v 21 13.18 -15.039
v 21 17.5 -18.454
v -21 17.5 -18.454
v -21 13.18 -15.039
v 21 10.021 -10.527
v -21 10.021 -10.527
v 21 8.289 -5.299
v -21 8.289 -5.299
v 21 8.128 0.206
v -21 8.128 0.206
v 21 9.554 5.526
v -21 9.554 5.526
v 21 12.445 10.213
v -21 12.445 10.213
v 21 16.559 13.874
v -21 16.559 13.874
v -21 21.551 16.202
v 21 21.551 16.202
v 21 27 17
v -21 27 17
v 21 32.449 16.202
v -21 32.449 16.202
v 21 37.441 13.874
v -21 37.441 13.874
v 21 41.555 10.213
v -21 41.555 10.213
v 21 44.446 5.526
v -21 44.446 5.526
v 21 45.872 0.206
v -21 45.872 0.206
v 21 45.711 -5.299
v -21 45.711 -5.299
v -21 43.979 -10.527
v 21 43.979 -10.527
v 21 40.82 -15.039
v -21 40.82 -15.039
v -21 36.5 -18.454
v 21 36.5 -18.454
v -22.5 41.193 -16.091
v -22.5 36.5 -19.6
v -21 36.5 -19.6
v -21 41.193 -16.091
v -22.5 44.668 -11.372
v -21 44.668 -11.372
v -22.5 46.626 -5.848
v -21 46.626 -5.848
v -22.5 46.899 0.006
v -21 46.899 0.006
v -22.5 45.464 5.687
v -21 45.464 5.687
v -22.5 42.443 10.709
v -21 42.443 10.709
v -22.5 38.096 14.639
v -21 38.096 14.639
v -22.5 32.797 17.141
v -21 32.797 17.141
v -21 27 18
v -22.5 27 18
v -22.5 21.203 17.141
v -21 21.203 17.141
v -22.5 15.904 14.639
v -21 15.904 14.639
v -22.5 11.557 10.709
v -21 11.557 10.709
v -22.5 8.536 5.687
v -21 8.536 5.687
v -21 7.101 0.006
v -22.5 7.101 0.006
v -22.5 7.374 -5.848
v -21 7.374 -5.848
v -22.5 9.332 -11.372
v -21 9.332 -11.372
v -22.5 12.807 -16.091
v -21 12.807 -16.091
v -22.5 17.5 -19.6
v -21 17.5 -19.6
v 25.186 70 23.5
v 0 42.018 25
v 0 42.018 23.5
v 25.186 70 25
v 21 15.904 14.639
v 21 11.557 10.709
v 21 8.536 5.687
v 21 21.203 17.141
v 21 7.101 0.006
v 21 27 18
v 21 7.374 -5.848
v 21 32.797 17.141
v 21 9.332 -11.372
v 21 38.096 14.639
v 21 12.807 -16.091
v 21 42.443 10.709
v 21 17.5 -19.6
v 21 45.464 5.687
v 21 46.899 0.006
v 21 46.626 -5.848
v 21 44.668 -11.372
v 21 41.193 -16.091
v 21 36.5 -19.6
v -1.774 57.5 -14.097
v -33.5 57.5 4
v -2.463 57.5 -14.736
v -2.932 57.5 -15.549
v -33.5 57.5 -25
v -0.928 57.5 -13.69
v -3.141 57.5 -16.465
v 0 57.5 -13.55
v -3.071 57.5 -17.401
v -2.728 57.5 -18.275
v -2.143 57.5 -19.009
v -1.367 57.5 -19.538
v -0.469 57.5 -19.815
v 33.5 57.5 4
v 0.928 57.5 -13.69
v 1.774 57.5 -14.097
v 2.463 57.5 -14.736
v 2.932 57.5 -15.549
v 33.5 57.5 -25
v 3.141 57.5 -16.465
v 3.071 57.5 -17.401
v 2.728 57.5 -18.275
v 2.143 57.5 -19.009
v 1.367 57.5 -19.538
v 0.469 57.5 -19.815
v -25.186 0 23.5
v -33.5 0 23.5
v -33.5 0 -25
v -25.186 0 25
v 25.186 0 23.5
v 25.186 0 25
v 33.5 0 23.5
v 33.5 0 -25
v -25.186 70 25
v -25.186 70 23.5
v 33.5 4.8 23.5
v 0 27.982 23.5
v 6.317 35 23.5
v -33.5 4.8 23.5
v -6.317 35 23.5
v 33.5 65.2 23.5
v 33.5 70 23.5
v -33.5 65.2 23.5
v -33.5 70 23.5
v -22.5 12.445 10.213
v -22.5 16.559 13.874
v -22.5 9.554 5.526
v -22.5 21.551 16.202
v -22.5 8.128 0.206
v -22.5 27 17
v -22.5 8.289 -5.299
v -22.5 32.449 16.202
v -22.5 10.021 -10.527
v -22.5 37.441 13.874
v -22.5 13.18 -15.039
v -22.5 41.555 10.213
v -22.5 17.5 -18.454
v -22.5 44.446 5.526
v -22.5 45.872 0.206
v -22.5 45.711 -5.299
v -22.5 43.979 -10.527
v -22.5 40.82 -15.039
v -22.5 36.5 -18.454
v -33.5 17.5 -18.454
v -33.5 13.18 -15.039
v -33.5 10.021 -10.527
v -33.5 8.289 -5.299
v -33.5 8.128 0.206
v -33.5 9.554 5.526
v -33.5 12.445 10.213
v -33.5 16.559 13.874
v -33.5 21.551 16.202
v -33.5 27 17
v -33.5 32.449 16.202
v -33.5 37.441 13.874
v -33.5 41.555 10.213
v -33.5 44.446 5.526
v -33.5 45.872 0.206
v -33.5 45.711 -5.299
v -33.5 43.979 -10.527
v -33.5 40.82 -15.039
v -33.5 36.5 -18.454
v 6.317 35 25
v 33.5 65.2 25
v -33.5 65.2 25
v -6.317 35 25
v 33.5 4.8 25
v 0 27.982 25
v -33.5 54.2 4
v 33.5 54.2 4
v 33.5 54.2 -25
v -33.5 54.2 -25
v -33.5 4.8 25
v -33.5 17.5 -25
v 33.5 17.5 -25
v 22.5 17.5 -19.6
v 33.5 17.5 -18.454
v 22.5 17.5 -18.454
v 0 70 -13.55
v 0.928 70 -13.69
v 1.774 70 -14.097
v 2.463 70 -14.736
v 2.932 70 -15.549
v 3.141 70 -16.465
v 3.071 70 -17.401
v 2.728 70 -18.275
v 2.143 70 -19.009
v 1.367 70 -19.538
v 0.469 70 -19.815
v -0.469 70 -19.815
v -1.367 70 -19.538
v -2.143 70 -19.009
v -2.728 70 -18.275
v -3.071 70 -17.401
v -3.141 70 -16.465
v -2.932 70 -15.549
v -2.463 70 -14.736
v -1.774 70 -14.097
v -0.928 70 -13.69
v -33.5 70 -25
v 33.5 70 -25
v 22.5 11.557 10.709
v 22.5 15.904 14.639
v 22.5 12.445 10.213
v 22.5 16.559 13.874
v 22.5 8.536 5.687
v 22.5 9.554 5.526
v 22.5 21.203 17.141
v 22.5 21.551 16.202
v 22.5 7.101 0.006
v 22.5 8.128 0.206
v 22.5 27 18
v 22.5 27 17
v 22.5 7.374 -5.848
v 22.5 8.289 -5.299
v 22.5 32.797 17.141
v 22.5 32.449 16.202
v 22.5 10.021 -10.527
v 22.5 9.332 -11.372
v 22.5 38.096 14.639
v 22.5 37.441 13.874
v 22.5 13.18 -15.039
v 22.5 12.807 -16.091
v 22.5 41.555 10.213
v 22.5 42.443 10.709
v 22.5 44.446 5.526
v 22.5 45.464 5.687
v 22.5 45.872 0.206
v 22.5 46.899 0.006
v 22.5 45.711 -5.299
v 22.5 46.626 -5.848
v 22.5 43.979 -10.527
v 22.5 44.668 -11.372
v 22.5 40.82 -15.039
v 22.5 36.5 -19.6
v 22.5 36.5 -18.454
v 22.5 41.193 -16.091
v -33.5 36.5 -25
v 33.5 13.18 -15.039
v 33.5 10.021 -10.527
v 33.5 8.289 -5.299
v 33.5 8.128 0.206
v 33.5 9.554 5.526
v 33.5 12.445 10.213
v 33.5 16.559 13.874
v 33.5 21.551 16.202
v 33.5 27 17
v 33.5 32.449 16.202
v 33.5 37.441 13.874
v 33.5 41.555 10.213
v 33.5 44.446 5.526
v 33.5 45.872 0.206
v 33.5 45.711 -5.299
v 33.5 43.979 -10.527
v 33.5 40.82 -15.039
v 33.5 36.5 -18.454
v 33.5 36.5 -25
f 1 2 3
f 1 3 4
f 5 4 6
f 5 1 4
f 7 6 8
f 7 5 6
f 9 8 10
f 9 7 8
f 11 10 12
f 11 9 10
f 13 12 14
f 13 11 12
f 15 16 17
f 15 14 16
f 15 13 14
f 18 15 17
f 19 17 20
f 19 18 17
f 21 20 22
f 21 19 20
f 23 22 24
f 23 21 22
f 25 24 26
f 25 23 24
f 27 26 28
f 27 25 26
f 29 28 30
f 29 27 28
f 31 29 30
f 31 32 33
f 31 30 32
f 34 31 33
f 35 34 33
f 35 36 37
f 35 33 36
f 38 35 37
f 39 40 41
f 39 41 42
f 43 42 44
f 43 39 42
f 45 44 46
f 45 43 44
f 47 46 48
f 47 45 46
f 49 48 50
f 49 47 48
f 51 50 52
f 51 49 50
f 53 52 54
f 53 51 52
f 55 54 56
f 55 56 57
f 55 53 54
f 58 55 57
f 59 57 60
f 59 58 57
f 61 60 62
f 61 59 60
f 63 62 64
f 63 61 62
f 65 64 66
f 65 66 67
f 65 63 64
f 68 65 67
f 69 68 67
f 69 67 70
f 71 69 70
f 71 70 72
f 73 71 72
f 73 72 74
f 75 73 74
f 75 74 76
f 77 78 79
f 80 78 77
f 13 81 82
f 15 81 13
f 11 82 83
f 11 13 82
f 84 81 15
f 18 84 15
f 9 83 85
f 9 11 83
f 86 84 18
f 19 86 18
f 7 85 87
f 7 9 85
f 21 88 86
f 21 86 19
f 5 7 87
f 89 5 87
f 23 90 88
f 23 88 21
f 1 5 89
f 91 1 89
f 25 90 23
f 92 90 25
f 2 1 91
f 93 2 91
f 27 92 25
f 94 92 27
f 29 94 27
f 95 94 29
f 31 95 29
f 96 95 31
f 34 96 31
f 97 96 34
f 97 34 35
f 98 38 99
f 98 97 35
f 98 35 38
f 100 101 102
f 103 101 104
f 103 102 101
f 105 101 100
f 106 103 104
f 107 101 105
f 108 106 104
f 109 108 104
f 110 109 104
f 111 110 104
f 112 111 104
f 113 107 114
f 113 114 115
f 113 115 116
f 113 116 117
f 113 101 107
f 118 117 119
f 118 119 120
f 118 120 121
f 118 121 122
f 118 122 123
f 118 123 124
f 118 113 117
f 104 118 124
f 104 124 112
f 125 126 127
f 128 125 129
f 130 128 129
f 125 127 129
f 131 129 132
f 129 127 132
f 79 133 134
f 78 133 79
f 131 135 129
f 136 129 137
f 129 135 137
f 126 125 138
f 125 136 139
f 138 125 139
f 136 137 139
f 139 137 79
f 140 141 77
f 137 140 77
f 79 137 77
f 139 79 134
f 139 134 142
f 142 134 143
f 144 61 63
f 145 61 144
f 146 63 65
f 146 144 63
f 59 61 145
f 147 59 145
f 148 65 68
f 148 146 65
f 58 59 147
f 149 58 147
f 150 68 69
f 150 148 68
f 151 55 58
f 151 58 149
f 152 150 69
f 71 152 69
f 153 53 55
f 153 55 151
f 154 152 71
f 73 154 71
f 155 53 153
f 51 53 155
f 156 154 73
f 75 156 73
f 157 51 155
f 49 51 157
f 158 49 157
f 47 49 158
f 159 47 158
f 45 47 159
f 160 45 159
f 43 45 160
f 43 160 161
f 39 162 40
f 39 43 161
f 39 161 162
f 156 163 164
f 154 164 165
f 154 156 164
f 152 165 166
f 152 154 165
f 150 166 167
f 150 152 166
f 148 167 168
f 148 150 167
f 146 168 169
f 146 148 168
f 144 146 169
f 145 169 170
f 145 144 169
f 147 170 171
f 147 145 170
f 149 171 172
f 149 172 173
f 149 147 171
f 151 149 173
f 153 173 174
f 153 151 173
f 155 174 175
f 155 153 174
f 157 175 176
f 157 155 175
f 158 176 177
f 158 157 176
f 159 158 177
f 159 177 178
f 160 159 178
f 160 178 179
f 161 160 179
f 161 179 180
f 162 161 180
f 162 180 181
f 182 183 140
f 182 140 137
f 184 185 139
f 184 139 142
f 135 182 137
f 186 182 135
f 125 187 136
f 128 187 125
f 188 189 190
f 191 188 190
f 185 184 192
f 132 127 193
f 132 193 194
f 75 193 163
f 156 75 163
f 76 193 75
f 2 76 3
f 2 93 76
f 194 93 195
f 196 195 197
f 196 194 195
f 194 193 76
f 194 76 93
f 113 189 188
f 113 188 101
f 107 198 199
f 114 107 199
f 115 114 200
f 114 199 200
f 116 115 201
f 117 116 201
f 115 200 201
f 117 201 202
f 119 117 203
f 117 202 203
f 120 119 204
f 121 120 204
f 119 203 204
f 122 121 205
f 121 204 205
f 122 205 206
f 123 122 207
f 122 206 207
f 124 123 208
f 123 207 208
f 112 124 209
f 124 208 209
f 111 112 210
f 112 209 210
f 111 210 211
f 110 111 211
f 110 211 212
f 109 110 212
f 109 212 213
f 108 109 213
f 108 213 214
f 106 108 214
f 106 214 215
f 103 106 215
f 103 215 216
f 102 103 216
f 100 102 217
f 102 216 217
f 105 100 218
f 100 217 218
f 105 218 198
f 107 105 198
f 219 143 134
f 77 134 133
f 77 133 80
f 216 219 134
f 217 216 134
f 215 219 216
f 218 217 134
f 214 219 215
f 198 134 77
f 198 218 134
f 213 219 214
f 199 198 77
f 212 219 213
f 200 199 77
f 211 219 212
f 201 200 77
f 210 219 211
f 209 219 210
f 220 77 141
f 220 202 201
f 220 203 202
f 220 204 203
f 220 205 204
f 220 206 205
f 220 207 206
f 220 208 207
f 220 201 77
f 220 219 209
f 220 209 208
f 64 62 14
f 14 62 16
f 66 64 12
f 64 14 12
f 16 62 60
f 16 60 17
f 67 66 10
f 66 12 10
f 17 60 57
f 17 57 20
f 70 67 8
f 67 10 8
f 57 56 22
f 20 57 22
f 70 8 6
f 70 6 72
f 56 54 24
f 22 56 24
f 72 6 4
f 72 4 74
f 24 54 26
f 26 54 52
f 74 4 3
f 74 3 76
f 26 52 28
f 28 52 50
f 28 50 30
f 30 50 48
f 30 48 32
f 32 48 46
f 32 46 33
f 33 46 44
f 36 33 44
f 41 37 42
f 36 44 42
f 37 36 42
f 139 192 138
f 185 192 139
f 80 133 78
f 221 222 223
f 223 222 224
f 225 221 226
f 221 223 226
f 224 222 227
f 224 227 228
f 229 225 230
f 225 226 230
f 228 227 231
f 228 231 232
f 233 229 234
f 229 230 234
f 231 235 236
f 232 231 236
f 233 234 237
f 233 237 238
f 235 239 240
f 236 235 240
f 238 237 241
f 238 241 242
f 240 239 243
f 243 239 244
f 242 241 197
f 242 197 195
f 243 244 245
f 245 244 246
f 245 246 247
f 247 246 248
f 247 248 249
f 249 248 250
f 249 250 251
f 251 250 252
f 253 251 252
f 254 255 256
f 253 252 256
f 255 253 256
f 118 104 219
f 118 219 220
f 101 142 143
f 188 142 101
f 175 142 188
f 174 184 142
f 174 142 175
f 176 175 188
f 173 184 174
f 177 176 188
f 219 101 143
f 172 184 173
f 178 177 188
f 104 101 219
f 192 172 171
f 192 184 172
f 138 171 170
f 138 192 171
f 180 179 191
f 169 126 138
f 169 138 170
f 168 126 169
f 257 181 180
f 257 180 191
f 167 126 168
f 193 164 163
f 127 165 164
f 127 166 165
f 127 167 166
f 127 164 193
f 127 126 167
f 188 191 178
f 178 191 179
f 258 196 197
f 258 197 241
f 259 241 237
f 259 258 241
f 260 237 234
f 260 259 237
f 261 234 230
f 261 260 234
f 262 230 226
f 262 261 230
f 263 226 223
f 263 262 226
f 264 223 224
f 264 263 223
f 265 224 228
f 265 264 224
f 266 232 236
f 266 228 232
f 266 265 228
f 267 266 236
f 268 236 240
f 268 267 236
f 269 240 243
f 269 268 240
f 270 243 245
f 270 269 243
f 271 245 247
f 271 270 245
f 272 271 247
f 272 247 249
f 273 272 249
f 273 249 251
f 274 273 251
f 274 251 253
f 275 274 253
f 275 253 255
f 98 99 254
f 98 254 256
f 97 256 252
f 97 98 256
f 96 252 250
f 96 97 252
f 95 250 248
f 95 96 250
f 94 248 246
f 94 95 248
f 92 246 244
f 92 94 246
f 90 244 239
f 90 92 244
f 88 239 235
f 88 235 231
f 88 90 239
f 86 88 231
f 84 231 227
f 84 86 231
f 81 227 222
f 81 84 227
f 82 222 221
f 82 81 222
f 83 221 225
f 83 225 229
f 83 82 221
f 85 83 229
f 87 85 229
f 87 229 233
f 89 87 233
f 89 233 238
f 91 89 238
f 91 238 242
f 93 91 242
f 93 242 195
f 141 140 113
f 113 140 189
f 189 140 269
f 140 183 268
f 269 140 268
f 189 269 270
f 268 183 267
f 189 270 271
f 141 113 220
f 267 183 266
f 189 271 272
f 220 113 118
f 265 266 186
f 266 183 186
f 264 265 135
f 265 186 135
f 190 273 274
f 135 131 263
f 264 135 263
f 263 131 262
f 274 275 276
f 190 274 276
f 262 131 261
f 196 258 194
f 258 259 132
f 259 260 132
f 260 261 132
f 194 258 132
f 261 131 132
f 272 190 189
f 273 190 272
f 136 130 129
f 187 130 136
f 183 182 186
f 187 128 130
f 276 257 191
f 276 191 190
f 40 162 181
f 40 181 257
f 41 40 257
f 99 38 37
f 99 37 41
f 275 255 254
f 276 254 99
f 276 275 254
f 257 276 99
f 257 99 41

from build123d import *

# Parameters (mm, degrees)
SKETCH1_W           = 67
SKETCH1_H           = 50
BOSS_EXTRUDE1_DEPTH = 70
SKETCH3_W           = 29
SKETCH3_H           = 3.3
CUT_EXTRUDE1_DEPTH  = 67
SKETCH4_R           = 20
CUT_EXTRUDE2_DEPTH  = 1.5
CUT_EXTRUDE3_START  = -1.5
SKETCH5_R           = 20
CUT_EXTRUDE3_DEPTH  = 1.5
SKETCH7_R           = 3.15
CUT_EXTRUDE4_DEPTH  = 12.5
CUT_EXTRUDE5_DEPTH  = 1.5


with BuildPart() as part:
    # Sketch1 → Boss-Extrude1 (new body)
    with BuildSketch(Plane(origin=(0, 0, 0), x_dir=(1, 0, 0), z_dir=(0, 1, 0))):
        Rectangle(SKETCH1_W, SKETCH1_H)
    extrude(amount=BOSS_EXTRUDE1_DEPTH)

    # Sketch3 → Cut-Extrude1 (cut)
    with BuildSketch(Plane(origin=(33.5, 0, 0), x_dir=(0, 0, -1), z_dir=(1, 0, 0))):
        with Locations((10.5, 55.85)):
            Rectangle(SKETCH3_W, SKETCH3_H)
        with BuildLine():
            Line((25, 36.5), (25, 17.5))
            Line((25, 17.5), (18.454482672, 17.5))
            ThreePointArc((18.454482672, 17.5), (-17, 27), (18.454482672, 36.5))
            Line((18.454482672, 36.5), (25, 36.5))
        make_face()
    extrude(amount=-CUT_EXTRUDE1_DEPTH, mode=Mode.SUBTRACT)

    # Sketch4 → Cut-Extrude2 (cut)
    with BuildSketch(Plane(origin=(21, 0, 0), x_dir=(0, 0, -1), z_dir=(1, 0, 0))):
        with Locations((2, 27)):
            Circle(SKETCH4_R)
    extrude(amount=CUT_EXTRUDE2_DEPTH, mode=Mode.SUBTRACT)

    # Sketch5 → Cut-Extrude3 (cut)
    with BuildSketch(Plane(origin=(-21, 0, 0), x_dir=(0, 0, -1), z_dir=(1, 0, 0)).offset(CUT_EXTRUDE3_START)):
        with Locations((2, 27)):
            Circle(SKETCH5_R)
    extrude(amount=CUT_EXTRUDE3_DEPTH, mode=Mode.SUBTRACT)

    # Sketch7 → Cut-Extrude4 (cut)
    with BuildSketch(Plane(origin=(0, 70, 0), x_dir=(1, 0, 0), z_dir=(0, 1, 0))):
        with Locations(Location((0, 16.7, 0), (0, 0, 270))):
            Circle(SKETCH7_R)
    extrude(amount=-CUT_EXTRUDE4_DEPTH, mode=Mode.SUBTRACT)

    # Sketch9 → Cut-Extrude5 (cut)
    with BuildSketch(Plane.XY.offset(25)):
        Polygon((-33.5, 0), (-33.5, 4.8), (-6.317148544, 35), (-33.5, 65.2), (-33.5, 70), (-25.186156124, 70), (0, 42.018317645), (25.186156124, 70), (33.5, 70), (33.5, 65.2), (6.317148544, 35), (33.5, 4.8), (33.5, 0), (25.186156124, 0), (0, 27.981682355), (-25.186156124, 0), align=None)
    extrude(amount=-CUT_EXTRUDE5_DEPTH, mode=Mode.SUBTRACT)


solid = part.part
